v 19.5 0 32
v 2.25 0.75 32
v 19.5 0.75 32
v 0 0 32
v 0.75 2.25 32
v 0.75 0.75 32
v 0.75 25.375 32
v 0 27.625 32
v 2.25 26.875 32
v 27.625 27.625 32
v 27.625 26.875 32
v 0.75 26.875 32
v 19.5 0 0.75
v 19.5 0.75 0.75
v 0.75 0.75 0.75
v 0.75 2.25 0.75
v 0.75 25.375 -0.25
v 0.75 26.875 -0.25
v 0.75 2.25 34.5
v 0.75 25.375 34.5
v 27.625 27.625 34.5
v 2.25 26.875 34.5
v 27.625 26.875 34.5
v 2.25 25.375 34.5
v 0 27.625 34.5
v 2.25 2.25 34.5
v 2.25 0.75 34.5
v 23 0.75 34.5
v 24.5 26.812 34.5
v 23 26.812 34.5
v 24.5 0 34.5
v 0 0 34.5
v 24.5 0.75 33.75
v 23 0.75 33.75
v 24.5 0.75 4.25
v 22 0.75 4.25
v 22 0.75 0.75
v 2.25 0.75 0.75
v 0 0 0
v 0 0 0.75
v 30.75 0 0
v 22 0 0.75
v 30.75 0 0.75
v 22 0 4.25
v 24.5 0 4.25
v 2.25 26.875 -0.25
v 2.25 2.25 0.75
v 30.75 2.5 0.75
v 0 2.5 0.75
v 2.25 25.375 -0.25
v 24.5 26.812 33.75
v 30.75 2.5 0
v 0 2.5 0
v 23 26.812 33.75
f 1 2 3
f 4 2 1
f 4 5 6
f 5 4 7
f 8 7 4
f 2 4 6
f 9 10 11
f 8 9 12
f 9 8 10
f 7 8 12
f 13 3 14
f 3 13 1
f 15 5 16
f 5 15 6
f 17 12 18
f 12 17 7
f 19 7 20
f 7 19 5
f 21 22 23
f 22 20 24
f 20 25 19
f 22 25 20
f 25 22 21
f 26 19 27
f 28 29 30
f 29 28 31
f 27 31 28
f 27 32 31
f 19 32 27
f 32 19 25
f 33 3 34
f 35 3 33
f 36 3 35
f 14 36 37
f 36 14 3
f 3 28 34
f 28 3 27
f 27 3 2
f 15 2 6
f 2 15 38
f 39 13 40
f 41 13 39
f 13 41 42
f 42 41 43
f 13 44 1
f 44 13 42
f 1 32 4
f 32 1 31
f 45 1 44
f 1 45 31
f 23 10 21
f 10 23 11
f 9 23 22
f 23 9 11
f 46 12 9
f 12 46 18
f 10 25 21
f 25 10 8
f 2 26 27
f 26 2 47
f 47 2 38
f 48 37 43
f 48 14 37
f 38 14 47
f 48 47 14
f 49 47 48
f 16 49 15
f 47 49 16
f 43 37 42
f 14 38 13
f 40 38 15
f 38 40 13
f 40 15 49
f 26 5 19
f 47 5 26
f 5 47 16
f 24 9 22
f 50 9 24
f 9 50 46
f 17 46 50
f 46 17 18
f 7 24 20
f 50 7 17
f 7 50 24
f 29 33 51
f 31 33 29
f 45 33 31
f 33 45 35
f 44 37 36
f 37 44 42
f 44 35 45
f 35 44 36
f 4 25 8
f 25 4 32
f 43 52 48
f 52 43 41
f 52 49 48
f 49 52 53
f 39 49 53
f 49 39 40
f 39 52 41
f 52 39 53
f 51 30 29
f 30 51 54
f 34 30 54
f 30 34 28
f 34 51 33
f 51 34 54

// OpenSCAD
// file: lib/lumber.scad
LUMBER_SIZES = [
  3/4, 1 + 1/2, 2 + 1/2
];

function lumberSize(size) = LUMBER_SIZES[size - 1];

module lumber(shape, length) {
    cube([lumberSize(shape[1]), lumberSize(shape[0]), length]);
}
// main file
use <lib/lumber.scad>;

color("blue")
    rotate([-90, 0, -90])
    translate([-lumberSize(3), -lumberSize(1), 0])
    lumber([1, 3], 30+3/4);

translate([0, 0, lumberSize(1)]) {
    color("brown") {
        translate([3/4, 0, 31 + 1/4])
            rotate([0, 90, 0])
            translate([-2.5, 0, 0])
            lumber([1, 3], 18+3/4);
        
        translate([3/4, 26+7/8, 31 + 1/4])
            rotate([0, 90, 0])
            translate([-lumberSize(3), 0, 0])
            lumber([1, 3], 26+7/8);
    }
    
    color("red") 
        translate([0, 0, 31 + 1/4])
        rotate([-90, -90, 0])
        lumber([1, 3], 27 + 5/8);

    color("green") {
        translate([3/4, 3/4, 0])
        lumber([2, 2], 33+3/4);
        
        translate([3/4, 26+7/8-1.5, -1])
        lumber([2, 2], 34+3/4);
    }
    
    color("yellow")
        translate([19+1/2, 0, 0]) { 
        lumber([1, 3], 33+3/4);
    
        translate([lumberSize(3), 0, 0])
        difference() {
            lumber([1, 3], 33+3/4);
            translate([0, -.1, -.1])
            cube([
                lumberSize(3) + .1, 
                lumberSize(1) + .5, 
                3.6]);
        }
    }
}

color("pink")
    translate([23+3/4, lumberSize(1), 33+3/4])
    rotate([-90, 0, 0])
    translate([-lumberSize(1), -lumberSize(1), 0])
    lumber([1, 2], 26+1/16);
